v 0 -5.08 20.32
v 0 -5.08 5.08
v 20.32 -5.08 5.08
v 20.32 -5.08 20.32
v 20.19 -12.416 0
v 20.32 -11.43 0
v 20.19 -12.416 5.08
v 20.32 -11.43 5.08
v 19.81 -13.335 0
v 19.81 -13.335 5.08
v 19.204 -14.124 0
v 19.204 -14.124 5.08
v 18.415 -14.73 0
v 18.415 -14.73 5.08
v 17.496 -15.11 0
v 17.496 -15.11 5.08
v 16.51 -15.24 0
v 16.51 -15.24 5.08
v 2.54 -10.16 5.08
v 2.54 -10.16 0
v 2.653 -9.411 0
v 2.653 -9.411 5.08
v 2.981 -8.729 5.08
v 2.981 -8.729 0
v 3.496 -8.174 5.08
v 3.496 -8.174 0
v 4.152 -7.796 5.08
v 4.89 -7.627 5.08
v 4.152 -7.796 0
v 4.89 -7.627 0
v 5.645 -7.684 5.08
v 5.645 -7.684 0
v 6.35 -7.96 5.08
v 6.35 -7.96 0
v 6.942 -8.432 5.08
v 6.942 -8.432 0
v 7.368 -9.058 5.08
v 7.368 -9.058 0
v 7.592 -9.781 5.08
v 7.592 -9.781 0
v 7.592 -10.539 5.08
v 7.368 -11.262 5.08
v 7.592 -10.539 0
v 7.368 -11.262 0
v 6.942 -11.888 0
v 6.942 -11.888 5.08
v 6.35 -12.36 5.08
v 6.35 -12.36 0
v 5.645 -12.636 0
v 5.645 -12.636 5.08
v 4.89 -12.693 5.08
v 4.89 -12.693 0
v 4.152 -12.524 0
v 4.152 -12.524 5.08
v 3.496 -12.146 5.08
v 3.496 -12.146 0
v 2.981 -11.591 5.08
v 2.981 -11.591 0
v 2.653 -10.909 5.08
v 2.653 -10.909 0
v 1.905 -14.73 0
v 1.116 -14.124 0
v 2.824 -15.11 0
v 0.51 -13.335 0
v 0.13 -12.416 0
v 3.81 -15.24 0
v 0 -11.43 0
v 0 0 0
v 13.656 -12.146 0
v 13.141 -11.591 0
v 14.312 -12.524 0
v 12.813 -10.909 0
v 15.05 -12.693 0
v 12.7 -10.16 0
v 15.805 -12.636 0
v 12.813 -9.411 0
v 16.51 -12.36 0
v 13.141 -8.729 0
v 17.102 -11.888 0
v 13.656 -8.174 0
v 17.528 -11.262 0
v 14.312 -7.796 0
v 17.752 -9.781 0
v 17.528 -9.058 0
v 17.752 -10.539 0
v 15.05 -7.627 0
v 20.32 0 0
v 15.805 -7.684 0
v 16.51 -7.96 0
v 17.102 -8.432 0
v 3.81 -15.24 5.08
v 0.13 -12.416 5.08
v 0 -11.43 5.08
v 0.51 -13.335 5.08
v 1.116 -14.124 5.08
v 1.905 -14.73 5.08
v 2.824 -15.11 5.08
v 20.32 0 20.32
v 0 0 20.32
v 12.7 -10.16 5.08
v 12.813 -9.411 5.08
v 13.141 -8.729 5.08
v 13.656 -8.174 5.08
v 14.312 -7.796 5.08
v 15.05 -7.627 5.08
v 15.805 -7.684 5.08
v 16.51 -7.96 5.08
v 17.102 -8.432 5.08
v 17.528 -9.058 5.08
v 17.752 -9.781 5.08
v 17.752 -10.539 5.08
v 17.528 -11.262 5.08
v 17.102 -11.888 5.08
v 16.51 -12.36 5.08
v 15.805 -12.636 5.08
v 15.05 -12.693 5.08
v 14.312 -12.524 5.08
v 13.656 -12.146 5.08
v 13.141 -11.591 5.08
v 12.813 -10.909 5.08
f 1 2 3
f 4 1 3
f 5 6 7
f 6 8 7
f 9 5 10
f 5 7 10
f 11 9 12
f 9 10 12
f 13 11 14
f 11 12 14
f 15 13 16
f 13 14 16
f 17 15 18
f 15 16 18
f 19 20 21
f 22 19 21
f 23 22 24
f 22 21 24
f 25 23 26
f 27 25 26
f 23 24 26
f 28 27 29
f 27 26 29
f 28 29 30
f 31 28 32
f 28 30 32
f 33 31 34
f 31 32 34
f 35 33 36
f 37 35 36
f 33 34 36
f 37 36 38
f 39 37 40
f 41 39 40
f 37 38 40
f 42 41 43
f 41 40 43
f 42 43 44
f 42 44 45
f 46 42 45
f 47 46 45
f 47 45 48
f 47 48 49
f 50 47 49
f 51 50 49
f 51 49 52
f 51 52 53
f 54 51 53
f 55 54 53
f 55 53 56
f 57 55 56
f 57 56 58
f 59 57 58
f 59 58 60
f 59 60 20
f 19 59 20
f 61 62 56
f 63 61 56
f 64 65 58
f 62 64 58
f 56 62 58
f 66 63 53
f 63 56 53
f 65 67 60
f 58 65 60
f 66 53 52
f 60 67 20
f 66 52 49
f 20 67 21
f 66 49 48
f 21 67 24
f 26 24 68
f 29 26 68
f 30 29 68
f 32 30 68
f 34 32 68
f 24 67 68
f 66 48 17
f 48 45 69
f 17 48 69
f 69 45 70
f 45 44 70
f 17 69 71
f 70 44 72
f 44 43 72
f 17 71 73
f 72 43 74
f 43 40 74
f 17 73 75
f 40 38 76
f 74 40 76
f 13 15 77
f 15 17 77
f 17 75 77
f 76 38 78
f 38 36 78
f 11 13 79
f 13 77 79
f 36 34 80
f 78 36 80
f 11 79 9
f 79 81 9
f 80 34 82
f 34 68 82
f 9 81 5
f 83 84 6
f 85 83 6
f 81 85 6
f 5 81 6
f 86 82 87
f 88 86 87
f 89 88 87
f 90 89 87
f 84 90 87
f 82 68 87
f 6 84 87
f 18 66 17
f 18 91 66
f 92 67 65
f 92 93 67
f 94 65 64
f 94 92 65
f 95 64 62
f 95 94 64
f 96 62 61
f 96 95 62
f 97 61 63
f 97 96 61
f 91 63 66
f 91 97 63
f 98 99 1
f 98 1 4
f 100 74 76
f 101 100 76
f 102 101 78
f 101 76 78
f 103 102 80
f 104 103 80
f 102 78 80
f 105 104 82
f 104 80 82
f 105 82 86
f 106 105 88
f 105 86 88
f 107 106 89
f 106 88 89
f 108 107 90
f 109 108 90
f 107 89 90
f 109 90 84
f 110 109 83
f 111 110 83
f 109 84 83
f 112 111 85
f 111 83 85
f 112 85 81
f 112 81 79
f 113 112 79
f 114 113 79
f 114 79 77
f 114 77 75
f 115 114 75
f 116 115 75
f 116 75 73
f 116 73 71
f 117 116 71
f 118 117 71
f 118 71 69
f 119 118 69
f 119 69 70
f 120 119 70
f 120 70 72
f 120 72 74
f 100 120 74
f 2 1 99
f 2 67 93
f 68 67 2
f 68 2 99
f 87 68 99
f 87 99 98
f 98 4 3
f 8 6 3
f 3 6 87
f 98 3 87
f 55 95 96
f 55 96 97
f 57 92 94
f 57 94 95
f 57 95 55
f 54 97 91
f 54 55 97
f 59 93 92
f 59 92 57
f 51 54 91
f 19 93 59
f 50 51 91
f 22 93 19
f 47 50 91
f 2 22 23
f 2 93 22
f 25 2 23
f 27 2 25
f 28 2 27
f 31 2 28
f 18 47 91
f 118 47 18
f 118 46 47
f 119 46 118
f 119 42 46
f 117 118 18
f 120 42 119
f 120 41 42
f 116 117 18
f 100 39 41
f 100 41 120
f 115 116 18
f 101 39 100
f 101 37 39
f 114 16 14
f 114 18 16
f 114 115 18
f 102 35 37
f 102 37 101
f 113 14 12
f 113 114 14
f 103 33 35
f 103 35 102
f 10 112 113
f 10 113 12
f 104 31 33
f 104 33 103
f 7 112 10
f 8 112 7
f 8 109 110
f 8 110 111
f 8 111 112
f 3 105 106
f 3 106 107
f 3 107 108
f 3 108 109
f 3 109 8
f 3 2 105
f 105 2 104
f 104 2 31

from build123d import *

# Parameters (mm, degrees)
F0_W     = 20.32
F0_H     = 5.08
F1_DEPTH = 15.24
F2_R     = 3.81
F4_D     = 5.08
F5_W     = 20.32
F5_H     = 5.08
F6_DEPTH = 15.24


with BuildPart() as f1:
    # F0 (on Front) → F1 (new body)
    with BuildSketch(Plane.XZ):
        with Locations((10.16, 2.54)):
            Rectangle(F0_W, F0_H)
    extrude(amount=F1_DEPTH)

    # F2
    f2_edges = [f1.edges().sort_by_distance(p)[0] for p in [
        (20.32, -15.24, 2.54),
        (0, -15.24, 2.54),
    ]]
    fillet(f2_edges, radius=F2_R)

    # F4 (through all)
    with Locations(Plane.XY.offset(5.08)):
        with Locations((5.08, -10.16), (15.24, -10.16)):
            Hole(F4_D / 2)

    # F5 (on face) → F6 (join)
    with BuildSketch(Plane.XY.offset(5.08)):
        with Locations((10.16, -2.54)):
            Rectangle(F5_W, F5_H)
    extrude(amount=F6_DEPTH)


solid = f1.part
